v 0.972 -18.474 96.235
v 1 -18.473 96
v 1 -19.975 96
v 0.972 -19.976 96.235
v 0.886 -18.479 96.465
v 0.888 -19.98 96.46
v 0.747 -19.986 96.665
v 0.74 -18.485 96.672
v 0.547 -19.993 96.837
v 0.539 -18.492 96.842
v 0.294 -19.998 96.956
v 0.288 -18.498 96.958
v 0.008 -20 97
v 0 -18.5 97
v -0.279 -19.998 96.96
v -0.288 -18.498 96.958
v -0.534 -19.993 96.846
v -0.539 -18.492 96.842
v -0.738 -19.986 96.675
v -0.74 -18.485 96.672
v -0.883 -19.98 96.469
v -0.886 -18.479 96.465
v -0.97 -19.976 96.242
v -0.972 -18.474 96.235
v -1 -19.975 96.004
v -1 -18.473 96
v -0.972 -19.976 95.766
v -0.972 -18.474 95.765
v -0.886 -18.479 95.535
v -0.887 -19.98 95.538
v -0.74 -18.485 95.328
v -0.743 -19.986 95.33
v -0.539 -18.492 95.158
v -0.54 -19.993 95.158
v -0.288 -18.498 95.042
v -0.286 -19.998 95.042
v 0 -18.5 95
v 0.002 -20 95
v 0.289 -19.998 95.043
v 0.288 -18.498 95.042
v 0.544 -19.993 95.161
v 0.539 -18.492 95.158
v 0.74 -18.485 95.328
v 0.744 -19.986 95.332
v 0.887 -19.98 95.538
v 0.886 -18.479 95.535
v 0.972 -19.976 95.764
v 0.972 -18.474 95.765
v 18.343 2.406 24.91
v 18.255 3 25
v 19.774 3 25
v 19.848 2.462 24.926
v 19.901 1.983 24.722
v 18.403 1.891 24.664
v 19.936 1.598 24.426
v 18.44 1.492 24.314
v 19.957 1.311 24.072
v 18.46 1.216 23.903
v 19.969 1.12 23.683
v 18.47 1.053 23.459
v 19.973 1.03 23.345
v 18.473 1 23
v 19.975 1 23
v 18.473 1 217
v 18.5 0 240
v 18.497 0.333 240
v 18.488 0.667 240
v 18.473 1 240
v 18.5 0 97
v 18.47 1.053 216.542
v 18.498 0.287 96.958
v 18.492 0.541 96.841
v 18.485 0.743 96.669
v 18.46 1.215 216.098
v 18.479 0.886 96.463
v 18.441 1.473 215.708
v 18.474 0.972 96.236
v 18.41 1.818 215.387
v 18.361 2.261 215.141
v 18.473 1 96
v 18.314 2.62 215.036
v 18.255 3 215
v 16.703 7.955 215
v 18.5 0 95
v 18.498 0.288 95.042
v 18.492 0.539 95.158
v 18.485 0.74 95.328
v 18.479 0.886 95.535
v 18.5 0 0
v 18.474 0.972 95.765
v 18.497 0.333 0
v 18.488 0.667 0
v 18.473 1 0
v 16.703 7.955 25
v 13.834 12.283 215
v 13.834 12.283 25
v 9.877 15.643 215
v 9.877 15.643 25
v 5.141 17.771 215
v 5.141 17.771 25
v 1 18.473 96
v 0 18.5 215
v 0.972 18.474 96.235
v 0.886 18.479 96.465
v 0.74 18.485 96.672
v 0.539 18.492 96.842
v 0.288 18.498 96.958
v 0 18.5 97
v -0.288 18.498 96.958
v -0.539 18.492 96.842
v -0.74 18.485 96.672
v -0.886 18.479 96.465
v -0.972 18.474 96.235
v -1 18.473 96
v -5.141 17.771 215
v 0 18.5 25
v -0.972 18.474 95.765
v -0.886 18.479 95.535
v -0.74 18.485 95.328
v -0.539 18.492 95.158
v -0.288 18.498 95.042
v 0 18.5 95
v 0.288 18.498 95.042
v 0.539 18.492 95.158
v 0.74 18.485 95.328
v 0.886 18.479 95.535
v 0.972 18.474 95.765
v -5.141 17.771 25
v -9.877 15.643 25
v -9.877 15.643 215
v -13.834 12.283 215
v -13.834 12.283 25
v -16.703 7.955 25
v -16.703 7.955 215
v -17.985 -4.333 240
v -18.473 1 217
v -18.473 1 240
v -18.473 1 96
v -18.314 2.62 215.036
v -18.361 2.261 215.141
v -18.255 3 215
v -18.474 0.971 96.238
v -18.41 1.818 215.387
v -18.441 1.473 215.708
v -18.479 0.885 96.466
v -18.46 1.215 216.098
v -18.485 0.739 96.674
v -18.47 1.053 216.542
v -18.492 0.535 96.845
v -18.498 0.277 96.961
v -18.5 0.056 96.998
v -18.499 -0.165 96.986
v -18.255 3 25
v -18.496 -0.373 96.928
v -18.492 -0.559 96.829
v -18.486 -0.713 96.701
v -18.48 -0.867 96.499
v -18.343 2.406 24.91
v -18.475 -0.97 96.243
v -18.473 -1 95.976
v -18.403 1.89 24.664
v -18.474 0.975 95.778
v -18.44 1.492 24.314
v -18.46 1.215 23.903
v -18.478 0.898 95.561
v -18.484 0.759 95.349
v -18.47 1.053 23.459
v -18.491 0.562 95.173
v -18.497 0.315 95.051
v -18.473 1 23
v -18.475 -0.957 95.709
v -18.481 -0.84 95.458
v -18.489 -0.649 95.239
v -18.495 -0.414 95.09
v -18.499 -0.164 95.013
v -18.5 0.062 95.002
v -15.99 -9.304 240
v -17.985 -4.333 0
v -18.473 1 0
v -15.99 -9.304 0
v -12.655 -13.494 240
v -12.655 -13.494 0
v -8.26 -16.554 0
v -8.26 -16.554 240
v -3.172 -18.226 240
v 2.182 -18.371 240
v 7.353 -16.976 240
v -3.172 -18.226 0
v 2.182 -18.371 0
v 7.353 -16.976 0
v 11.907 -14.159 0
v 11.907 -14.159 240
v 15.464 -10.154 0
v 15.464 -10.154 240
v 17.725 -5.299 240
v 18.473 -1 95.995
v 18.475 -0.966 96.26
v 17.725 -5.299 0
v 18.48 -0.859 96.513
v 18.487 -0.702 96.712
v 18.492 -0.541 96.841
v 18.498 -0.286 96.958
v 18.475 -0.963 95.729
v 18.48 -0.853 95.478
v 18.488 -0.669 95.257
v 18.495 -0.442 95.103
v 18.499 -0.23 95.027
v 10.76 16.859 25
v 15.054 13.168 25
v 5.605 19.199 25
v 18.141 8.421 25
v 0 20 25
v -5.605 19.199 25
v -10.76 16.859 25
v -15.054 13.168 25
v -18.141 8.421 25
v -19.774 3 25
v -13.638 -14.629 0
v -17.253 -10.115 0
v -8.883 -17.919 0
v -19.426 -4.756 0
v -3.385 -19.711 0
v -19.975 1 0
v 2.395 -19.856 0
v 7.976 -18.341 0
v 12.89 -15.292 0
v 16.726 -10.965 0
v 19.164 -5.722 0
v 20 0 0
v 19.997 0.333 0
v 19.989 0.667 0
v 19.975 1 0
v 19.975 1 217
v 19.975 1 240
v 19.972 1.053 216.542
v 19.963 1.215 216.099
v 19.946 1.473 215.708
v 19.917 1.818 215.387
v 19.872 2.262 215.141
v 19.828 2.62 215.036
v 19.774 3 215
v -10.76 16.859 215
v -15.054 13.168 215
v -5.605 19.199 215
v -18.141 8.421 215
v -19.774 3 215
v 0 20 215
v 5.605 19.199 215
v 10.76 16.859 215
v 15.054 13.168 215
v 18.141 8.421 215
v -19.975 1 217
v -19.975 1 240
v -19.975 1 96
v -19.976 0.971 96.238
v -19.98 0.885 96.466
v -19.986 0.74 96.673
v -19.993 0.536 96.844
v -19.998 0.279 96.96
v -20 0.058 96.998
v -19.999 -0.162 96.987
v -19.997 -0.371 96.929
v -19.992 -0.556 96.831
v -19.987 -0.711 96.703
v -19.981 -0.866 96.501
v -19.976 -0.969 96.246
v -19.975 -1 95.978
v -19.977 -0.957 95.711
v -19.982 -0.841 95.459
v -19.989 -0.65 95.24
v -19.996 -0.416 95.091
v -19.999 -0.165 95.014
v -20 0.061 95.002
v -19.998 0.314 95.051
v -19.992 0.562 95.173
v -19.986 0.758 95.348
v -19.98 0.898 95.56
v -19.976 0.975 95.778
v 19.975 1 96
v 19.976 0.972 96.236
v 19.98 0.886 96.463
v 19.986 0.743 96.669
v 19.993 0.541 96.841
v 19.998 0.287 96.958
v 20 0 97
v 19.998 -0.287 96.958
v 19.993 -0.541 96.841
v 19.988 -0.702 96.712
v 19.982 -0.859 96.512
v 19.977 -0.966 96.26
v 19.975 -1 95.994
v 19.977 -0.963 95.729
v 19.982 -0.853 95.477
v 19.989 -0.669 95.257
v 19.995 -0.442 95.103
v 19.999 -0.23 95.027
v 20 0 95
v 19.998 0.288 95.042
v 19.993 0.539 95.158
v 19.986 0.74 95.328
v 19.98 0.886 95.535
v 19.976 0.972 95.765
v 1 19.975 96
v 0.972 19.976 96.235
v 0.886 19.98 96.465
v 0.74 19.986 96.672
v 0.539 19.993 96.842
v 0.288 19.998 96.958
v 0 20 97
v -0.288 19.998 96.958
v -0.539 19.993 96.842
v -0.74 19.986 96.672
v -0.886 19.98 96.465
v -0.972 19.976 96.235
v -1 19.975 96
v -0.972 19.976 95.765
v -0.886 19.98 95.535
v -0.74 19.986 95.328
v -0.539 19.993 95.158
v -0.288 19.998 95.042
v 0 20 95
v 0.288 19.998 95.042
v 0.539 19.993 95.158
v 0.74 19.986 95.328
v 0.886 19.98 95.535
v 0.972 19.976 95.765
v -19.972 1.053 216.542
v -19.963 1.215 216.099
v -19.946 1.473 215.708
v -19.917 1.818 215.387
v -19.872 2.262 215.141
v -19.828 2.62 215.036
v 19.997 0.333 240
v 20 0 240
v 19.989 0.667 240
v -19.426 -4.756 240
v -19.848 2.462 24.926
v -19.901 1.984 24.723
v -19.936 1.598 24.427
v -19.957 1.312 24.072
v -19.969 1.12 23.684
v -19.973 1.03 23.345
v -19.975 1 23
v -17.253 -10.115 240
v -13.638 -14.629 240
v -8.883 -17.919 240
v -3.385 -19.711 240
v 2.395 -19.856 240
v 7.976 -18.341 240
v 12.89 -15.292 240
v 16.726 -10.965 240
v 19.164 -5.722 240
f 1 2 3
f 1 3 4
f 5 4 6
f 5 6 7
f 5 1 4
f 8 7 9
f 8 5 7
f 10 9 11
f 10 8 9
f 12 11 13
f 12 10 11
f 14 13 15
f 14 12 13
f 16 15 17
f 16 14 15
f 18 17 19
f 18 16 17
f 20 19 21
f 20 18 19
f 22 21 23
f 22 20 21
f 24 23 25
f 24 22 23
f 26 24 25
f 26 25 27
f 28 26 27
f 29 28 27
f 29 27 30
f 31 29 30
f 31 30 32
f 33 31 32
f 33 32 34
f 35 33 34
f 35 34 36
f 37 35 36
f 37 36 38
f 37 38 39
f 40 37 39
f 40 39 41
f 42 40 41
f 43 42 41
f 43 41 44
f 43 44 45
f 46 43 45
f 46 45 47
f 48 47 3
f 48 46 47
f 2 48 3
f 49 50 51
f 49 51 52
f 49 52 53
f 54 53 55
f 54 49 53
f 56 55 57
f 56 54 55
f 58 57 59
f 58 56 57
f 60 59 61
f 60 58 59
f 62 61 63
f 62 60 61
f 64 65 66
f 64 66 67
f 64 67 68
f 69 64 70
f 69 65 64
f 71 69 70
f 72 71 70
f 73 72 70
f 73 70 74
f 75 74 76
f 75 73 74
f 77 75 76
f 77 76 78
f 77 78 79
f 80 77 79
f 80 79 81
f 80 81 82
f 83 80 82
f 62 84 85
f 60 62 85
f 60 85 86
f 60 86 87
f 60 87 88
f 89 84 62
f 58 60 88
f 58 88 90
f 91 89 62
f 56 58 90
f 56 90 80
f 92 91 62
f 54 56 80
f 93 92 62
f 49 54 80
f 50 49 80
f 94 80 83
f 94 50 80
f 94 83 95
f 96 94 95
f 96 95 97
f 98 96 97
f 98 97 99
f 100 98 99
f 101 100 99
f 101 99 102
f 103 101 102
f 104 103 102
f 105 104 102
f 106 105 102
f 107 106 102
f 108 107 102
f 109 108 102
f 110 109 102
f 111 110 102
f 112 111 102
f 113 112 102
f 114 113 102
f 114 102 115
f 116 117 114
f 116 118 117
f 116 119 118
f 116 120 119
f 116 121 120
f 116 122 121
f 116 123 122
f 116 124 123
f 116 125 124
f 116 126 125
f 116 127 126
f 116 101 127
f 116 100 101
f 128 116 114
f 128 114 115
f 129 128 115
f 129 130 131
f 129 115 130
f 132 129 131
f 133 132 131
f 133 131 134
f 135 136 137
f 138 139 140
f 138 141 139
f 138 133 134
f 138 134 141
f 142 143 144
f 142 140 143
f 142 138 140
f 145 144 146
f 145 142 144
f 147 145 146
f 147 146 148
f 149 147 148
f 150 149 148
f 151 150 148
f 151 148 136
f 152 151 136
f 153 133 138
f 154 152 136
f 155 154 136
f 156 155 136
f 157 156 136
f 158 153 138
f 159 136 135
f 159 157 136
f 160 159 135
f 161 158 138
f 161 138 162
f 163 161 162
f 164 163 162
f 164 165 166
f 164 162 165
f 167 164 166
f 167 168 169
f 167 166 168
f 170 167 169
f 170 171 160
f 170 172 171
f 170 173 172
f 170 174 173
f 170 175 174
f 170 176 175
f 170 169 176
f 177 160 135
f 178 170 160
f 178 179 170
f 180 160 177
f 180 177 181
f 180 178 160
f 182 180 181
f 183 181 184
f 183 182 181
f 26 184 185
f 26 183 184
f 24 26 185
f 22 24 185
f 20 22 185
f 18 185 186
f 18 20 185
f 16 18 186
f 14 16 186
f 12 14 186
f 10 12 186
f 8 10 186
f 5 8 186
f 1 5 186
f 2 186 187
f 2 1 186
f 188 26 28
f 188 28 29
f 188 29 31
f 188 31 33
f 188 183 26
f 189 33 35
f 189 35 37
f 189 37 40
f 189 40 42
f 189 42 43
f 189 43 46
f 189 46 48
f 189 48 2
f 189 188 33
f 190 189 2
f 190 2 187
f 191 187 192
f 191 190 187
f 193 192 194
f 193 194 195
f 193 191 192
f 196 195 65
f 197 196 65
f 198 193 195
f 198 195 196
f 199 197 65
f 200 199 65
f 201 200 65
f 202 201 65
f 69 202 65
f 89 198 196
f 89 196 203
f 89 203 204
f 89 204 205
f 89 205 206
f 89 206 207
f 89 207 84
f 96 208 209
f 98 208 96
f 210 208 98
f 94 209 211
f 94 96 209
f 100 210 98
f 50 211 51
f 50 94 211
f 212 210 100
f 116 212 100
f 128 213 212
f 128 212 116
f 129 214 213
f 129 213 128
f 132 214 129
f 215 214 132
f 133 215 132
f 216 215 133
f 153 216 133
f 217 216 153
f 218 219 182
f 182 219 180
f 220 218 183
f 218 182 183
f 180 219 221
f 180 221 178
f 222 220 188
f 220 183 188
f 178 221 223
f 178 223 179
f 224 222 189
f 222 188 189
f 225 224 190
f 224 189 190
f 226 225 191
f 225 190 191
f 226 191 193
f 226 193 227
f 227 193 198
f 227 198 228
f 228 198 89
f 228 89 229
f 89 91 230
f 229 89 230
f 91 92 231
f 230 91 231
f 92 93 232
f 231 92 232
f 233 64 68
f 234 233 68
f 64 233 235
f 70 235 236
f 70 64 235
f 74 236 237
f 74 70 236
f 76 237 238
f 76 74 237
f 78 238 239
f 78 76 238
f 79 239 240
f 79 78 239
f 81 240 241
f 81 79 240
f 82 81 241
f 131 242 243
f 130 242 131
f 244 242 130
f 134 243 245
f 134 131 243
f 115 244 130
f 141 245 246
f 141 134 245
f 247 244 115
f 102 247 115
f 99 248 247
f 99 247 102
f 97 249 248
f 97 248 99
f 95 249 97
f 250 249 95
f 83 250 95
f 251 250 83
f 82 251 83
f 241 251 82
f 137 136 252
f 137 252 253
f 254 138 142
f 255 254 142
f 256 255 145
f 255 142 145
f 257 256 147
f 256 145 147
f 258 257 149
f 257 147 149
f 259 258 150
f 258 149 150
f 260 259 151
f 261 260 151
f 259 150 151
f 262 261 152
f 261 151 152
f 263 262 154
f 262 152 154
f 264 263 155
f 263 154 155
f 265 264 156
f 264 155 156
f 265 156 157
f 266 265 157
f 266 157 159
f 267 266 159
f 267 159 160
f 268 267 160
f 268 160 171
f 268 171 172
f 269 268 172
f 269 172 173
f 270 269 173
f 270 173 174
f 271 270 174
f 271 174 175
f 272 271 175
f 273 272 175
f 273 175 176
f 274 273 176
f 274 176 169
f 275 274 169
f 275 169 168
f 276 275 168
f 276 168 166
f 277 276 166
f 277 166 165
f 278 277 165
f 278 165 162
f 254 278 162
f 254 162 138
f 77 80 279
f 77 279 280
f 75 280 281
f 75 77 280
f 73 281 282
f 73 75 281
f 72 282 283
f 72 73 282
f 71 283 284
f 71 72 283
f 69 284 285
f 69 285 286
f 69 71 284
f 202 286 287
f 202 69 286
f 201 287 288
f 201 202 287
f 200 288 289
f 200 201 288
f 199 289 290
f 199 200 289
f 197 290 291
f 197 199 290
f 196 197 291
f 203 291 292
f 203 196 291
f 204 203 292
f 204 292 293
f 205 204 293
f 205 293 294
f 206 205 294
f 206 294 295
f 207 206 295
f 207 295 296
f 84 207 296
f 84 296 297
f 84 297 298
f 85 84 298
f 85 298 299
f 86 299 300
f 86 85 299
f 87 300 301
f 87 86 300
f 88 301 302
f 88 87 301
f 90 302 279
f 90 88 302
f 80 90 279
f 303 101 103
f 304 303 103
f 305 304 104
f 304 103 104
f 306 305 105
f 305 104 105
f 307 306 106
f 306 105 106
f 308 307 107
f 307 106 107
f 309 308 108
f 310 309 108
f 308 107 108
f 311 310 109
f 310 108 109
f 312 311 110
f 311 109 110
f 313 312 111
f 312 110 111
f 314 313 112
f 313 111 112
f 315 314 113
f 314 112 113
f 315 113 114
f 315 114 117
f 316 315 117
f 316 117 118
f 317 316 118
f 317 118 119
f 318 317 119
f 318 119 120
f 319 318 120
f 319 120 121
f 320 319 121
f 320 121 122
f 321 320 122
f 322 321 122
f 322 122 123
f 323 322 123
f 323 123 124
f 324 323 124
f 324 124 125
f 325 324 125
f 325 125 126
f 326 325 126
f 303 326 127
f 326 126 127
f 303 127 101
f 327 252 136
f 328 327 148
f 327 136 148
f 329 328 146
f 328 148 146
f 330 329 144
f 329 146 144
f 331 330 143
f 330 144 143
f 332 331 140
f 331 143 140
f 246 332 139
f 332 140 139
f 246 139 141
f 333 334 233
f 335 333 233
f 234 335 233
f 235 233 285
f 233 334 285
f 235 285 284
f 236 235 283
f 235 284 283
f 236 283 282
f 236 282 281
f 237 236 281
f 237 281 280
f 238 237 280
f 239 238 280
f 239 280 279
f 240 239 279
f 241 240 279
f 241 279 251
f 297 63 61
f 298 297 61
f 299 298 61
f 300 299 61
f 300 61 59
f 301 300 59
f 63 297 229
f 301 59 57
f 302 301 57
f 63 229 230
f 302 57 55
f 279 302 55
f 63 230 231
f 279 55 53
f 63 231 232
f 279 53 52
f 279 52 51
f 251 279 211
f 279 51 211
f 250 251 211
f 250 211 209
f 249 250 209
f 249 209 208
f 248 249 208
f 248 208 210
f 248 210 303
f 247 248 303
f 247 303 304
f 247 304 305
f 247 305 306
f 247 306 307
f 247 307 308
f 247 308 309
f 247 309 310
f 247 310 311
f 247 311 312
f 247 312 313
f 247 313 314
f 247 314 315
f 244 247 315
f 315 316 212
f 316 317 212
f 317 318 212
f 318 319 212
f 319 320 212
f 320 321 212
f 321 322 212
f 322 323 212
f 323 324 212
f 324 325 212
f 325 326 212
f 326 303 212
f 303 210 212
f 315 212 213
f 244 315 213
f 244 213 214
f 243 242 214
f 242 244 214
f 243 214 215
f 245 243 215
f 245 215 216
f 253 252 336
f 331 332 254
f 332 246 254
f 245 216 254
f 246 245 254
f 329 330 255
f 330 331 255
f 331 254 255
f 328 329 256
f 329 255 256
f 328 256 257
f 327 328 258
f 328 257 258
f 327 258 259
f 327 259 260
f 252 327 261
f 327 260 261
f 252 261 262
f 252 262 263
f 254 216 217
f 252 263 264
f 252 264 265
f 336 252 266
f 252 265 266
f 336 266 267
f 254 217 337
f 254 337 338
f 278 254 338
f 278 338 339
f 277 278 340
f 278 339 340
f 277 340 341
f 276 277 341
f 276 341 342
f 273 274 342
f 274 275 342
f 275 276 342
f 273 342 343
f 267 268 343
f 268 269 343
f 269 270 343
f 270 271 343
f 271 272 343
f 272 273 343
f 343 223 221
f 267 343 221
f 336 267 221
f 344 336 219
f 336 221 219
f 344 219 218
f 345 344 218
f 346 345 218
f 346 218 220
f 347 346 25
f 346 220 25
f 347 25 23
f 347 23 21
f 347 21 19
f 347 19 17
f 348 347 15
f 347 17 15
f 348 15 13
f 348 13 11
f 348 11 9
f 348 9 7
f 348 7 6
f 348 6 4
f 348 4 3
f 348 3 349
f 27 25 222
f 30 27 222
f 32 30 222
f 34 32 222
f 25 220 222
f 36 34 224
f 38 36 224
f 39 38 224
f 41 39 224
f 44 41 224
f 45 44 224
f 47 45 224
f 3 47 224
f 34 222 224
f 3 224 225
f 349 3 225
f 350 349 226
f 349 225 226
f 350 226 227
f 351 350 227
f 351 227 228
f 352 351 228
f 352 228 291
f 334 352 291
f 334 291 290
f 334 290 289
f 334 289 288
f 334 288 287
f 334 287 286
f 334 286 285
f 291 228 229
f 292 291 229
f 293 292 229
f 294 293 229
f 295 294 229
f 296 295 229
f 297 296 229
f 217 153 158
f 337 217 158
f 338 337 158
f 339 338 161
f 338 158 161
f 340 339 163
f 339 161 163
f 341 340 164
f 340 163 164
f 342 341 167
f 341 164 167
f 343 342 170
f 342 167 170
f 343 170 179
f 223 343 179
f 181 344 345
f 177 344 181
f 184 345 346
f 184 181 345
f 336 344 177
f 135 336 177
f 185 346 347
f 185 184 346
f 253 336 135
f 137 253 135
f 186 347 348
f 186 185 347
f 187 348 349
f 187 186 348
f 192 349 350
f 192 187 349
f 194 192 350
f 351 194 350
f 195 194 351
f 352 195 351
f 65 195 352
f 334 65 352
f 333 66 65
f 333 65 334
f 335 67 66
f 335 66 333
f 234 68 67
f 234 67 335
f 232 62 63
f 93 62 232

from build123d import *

# Parameters (mm, degrees)
SKETCH_R             = 20
SKETCH_R_2           = 18.5
PAD_DEPTH            = 240
SKETCH007_R          = 1
POCKET_DEPTH         = 20.001
POCKET_DEPTH_BACK    = 20.001
SKETCH008_R          = 1
POCKET001_DEPTH      = 20.001
POCKET001_DEPTH_BACK = -20.001


with BuildPart() as part:
    # Sketch → Pad (new body)
    with BuildSketch(Plane.XY):
        Circle(SKETCH_R)
        Circle(SKETCH_R_2, mode=Mode.SUBTRACT)
    extrude(amount=PAD_DEPTH)

    # Sketch007 → Pocket (cut, two sides)
    with BuildSketch(Plane.YZ) as pocket_sk:
        with Locations((0, 96)):
            Circle(SKETCH007_R)
        with BuildLine():
            Line((1, 0), (22, 0))
            Line((22, 0), (22, 25))
            Line((22, 25), (3, 25))
            ThreePointArc((3, 25), (1.585786, 24.414214), (1, 23))
            Line((1, 23), (1, 0))
        make_face()
        with BuildLine():
            Line((1, 240), (22, 240))
            Line((22, 240), (22, 215))
            Line((22, 215), (3, 215))
            ThreePointArc((1, 217), (1.585786, 215.585786), (3, 215))
            Line((1, 217), (1, 240))
        make_face()
    extrude(amount=POCKET_DEPTH, mode=Mode.SUBTRACT)
    extrude(pocket_sk.sketch, amount=-POCKET_DEPTH_BACK, mode=Mode.SUBTRACT)

    # Sketch008 → Pocket001 (cut, two sides)
    with BuildSketch(Plane.XZ) as pocket001_sk:
        with Locations((0, 96)):
            Circle(SKETCH008_R)
    extrude(amount=-POCKET001_DEPTH, mode=Mode.SUBTRACT)
    extrude(pocket001_sk.sketch, amount=-POCKET001_DEPTH_BACK, mode=Mode.SUBTRACT)


solid = part.part
